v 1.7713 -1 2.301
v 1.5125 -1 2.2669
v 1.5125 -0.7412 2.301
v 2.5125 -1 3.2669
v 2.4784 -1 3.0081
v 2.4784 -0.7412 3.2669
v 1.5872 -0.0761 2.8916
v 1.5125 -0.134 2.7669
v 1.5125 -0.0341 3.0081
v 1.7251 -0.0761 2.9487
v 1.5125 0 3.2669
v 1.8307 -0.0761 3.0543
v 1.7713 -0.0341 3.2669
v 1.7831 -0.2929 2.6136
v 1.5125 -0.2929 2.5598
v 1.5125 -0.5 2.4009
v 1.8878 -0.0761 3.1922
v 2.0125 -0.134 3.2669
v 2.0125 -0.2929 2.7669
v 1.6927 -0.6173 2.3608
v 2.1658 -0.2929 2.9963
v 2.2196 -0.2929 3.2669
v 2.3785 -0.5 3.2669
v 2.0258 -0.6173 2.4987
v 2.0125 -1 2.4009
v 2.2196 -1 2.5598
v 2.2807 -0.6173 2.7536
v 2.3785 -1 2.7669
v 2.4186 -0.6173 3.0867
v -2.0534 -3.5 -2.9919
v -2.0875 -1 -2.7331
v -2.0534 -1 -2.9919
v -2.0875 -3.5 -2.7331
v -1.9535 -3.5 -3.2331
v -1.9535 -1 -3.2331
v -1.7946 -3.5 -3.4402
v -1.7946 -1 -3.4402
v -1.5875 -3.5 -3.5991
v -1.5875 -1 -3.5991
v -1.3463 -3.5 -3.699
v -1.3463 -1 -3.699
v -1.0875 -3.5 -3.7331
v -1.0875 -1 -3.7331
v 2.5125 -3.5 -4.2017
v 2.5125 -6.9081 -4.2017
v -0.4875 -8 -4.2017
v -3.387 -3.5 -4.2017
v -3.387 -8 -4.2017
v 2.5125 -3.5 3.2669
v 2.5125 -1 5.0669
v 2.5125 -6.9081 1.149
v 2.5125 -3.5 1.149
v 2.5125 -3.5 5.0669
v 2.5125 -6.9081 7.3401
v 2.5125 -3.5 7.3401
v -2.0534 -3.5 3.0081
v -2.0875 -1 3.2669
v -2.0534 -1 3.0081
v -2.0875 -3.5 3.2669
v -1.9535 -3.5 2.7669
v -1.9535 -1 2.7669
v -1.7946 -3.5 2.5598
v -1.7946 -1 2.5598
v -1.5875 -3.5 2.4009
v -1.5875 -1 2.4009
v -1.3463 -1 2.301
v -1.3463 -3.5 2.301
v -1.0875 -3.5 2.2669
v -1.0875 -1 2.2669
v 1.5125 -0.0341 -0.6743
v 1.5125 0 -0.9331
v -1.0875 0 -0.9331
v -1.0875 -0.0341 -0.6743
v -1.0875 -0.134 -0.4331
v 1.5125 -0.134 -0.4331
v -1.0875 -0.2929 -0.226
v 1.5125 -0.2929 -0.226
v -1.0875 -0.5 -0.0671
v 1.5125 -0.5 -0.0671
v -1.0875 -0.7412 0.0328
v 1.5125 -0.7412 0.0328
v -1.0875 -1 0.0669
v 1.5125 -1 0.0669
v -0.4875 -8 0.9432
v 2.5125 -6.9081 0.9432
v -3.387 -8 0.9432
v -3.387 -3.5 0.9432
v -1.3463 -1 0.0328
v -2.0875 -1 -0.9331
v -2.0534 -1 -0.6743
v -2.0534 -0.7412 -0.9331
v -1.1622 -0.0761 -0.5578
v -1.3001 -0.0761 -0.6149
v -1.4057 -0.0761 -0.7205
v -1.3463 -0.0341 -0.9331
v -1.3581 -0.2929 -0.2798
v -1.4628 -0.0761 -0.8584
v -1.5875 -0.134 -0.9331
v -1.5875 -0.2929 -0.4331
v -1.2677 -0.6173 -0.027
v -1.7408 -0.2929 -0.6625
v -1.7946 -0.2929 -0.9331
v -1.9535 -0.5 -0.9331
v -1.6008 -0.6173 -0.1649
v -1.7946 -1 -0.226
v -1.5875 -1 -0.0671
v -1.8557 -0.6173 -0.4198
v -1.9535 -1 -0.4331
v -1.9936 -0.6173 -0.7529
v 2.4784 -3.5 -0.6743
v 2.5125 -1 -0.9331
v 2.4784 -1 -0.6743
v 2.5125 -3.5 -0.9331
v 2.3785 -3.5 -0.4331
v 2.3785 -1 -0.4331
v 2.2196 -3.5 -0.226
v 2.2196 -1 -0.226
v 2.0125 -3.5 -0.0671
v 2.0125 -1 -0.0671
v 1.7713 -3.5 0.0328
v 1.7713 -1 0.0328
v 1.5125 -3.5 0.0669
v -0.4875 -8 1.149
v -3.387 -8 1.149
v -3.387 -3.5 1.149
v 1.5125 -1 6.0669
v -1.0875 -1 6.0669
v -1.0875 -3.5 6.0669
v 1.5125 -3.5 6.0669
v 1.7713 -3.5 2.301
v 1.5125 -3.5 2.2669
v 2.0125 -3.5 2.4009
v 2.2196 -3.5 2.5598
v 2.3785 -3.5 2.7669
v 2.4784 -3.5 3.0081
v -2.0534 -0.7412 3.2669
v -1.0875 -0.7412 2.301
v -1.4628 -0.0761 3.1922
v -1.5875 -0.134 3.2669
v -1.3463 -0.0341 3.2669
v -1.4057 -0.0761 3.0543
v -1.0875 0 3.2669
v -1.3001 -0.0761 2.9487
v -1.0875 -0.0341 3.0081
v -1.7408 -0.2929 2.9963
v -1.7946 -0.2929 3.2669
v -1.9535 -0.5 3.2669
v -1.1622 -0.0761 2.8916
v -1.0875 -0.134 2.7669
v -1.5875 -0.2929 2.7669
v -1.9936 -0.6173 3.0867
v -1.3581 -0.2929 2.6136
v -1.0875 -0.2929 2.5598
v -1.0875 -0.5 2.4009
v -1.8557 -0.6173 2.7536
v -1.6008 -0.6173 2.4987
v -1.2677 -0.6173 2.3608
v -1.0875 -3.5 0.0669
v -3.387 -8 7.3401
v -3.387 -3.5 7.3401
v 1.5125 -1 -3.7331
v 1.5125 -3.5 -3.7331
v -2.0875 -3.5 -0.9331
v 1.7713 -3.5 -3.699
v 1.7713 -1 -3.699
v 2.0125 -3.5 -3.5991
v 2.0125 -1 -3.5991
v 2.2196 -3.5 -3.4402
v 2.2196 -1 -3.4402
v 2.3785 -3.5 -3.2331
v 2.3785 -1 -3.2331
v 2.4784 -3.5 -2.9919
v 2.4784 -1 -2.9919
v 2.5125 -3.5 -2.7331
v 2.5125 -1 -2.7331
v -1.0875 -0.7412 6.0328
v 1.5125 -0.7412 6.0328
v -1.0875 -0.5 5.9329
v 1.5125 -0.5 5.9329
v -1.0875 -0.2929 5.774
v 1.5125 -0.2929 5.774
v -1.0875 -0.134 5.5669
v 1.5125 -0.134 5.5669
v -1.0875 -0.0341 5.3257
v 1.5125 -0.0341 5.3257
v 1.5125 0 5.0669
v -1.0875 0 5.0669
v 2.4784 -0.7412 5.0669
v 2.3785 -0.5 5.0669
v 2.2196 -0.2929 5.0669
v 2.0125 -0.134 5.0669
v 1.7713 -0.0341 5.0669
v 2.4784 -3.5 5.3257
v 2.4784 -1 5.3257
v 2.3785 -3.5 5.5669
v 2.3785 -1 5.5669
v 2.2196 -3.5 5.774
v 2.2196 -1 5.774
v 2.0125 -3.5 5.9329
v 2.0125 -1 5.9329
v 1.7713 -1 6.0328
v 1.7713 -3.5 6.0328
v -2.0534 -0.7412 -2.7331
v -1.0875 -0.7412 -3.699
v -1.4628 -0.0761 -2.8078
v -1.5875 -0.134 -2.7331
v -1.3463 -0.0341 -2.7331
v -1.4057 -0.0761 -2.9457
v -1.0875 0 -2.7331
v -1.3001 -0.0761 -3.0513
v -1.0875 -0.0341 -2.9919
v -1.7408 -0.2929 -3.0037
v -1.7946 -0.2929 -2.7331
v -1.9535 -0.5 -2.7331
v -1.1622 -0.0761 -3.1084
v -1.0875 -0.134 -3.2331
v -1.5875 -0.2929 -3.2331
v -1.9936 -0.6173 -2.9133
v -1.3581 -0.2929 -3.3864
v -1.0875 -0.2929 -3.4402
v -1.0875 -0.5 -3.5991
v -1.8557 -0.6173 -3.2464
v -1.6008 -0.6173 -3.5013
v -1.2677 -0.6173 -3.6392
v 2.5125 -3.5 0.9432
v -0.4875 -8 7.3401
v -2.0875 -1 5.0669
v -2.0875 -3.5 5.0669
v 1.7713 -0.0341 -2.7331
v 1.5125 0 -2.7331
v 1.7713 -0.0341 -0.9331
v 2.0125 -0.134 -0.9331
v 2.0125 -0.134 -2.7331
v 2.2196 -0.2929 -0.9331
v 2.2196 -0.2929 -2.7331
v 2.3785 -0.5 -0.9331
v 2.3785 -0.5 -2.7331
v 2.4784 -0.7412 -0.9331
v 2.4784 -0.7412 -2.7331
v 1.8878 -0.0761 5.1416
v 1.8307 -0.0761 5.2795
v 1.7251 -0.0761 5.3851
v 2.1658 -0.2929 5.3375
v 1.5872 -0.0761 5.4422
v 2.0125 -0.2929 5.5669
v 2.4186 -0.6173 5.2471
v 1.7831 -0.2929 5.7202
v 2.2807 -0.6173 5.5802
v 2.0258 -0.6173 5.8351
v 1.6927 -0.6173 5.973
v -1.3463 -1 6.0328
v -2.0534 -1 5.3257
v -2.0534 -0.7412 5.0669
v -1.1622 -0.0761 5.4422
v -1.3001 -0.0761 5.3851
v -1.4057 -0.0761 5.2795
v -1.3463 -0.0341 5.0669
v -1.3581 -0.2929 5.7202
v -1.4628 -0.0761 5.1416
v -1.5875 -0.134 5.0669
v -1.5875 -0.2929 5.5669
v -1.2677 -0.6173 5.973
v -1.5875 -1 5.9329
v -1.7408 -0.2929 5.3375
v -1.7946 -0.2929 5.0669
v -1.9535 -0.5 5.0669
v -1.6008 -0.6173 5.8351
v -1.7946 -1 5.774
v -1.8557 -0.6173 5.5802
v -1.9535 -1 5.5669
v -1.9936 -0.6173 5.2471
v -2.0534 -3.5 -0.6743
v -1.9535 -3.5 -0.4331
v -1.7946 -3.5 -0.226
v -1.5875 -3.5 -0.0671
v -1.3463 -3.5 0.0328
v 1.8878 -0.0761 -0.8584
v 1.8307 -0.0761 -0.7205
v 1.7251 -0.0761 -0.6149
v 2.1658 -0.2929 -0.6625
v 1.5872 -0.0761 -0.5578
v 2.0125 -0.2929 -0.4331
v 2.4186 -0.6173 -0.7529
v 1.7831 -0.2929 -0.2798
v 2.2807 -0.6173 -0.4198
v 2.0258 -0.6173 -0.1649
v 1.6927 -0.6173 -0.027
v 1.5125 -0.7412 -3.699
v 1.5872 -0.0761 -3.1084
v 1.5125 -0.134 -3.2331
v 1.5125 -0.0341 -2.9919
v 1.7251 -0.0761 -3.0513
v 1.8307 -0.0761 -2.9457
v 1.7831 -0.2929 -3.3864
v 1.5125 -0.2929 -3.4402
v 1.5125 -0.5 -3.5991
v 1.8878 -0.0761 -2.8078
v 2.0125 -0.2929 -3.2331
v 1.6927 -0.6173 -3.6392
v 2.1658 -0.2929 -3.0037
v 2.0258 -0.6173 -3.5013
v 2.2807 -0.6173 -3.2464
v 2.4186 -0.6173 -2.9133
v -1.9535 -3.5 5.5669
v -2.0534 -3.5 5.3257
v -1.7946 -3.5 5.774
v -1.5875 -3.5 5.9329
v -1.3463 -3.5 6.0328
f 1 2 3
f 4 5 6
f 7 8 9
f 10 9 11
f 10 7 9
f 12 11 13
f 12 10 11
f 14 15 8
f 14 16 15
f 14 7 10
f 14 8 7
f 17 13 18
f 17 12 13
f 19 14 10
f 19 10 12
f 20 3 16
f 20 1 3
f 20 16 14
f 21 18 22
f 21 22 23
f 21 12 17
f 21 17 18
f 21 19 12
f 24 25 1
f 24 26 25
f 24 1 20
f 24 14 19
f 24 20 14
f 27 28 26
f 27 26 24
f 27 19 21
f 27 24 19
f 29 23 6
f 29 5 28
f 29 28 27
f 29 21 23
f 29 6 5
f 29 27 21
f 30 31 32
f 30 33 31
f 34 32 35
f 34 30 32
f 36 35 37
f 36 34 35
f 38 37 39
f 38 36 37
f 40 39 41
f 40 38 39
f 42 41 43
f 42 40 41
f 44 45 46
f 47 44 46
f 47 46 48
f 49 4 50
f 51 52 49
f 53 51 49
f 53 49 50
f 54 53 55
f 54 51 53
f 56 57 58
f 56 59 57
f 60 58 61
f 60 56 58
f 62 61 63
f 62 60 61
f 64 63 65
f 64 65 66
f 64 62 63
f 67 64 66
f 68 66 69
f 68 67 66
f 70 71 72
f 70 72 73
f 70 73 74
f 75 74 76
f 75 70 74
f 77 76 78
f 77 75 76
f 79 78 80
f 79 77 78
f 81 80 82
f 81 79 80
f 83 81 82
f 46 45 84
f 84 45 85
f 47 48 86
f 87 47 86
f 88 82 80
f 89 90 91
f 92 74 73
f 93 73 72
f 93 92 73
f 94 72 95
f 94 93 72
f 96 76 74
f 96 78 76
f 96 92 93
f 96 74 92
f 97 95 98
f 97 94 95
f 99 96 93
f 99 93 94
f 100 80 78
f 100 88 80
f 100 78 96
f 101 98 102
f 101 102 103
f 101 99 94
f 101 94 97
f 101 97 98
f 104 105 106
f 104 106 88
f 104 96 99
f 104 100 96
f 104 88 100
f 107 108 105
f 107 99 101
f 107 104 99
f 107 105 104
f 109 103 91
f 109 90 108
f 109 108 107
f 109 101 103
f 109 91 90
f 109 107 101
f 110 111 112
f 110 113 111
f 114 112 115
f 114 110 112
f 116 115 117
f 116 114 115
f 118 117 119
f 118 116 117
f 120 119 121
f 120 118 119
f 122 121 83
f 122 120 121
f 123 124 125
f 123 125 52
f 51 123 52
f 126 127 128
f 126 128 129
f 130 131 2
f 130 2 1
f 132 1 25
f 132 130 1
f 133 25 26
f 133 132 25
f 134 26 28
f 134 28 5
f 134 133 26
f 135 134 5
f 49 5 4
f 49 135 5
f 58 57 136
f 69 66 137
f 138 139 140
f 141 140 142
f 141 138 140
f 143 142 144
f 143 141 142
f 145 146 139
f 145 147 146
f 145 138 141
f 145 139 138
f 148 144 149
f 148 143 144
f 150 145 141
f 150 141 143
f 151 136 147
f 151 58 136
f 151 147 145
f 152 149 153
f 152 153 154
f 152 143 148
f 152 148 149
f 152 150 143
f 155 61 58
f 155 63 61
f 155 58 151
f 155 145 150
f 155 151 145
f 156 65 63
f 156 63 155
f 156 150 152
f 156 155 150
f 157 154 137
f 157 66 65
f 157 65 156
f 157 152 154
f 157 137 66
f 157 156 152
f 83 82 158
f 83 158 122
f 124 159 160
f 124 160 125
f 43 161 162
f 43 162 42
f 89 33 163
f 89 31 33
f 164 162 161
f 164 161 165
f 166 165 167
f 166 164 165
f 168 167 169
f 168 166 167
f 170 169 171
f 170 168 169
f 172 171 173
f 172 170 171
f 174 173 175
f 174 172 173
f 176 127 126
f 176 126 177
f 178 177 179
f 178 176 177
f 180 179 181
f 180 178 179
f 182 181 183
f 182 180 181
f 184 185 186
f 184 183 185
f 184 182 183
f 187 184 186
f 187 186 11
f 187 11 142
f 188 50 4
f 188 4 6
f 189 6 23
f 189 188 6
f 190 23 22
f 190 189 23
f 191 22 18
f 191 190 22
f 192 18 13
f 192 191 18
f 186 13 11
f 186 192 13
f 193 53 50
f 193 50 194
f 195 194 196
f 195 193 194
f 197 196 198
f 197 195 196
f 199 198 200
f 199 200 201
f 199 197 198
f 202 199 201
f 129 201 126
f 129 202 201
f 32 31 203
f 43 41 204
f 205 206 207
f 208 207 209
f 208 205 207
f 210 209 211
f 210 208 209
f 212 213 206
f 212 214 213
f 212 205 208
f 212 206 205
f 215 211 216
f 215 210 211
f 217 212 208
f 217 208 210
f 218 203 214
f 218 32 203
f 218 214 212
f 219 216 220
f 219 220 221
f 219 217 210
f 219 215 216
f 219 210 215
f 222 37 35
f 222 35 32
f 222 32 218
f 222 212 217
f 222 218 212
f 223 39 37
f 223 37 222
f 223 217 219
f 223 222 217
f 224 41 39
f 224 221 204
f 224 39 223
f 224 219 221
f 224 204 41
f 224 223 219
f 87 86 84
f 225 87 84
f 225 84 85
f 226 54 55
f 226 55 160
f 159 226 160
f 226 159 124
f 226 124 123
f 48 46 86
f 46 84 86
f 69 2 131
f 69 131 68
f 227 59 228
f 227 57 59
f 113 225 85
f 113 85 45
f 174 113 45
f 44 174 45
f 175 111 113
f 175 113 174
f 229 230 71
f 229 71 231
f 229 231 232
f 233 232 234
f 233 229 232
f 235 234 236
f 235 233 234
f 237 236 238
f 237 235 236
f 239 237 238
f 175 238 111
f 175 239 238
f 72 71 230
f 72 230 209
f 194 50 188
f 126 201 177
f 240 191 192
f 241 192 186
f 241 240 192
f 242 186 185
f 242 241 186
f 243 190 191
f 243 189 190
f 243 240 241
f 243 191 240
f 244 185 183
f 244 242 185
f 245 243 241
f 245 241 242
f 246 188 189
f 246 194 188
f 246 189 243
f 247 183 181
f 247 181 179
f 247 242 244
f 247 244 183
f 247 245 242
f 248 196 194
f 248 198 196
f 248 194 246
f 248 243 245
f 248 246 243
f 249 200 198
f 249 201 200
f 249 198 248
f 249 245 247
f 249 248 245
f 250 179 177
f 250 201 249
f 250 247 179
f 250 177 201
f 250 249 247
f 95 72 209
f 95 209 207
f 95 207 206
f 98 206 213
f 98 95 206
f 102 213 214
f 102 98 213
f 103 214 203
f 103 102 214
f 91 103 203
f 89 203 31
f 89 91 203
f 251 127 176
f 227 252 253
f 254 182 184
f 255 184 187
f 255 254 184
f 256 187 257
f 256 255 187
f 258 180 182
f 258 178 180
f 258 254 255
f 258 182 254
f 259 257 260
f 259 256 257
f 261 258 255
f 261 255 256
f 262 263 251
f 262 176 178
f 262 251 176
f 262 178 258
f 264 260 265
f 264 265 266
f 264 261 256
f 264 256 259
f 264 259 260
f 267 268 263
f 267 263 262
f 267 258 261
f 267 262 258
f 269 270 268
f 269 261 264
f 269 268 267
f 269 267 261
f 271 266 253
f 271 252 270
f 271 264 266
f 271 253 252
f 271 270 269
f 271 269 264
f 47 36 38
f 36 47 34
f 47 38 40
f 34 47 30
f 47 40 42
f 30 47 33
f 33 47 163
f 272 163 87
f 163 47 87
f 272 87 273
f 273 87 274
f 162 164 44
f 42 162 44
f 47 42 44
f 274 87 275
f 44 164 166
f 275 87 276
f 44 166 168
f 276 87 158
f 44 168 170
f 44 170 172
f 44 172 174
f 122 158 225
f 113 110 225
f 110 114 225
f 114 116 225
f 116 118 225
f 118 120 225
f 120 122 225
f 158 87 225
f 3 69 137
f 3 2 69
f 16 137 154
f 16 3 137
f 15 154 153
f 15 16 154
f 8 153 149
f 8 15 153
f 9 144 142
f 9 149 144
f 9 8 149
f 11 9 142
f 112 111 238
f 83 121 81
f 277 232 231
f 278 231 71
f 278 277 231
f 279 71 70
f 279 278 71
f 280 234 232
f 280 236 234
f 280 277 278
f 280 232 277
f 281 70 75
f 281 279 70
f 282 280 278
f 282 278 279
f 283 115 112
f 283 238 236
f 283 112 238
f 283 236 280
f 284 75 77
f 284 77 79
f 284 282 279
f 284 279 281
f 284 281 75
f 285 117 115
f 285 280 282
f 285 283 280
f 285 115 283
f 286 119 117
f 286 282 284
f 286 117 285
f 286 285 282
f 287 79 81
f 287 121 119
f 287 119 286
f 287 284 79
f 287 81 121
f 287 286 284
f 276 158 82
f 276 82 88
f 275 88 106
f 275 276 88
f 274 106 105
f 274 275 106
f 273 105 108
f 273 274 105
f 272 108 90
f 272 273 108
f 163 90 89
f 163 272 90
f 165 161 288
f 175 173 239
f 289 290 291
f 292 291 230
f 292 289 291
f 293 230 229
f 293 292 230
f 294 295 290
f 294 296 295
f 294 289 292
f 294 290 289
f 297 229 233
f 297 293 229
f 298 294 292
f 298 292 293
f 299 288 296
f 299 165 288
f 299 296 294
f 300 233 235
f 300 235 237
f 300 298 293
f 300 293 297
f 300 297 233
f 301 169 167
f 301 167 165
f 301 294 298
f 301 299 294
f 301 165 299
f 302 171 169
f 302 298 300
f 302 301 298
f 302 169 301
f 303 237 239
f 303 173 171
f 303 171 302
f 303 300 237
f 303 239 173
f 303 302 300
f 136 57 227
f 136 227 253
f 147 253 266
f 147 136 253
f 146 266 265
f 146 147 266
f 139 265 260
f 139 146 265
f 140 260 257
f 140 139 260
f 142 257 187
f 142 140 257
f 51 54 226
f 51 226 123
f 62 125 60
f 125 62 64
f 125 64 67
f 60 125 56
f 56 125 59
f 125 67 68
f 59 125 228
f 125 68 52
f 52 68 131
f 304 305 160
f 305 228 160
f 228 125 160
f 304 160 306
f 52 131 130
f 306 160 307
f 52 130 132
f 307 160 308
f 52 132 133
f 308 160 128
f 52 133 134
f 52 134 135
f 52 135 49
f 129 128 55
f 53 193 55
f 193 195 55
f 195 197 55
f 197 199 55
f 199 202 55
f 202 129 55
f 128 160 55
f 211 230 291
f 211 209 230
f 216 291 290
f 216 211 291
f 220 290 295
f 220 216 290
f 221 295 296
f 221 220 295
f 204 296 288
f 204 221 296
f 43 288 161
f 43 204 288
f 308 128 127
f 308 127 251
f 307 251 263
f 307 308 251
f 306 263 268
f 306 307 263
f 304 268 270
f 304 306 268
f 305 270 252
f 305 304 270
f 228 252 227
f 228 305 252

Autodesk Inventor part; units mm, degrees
ref_plane "YZ Plane" through (0, 0, 0) normal (1, 0, 0) x (0, 1, 0)
ref_plane "XZ Plane" through (0, 0, 0) normal (0, 1, 0) x (-1, 0, 0)
ref_plane "XY Plane" through (0, 0, 0) normal (0, 0, 1) x (1, 0, 0)
sketch "Sketch1" plane through (0, 0, 0) normal (0, 1, 0) x (-1, 0, 0)
  line L0 (2.0875, 6.0669) -> (-2.5125, 6.0669)
  line L1 (-2.5125, 6.0669) -> (-2.5125, 2.2669)
  line L2 (-2.5125, 2.2669) -> (2.0875, 2.2669)
  line L3 (2.0875, 2.2669) -> (2.0875, 6.0669)
  line L4 (2.0875, 6.0669) -> (-2.5125, 2.2669) construction
  line L5 (-2.5125, 6.0669) -> (2.0875, 2.2669) construction
  line L6 (-2.5125, -3.7331) -> (2.0875, -3.7331)
  line L7 (2.0875, -3.7331) -> (2.0875, 0.0669)
  line L8 (2.0875, 0.0669) -> (-2.5125, 0.0669)
  line L9 (-2.5125, 0.0669) -> (-2.5125, -3.7331)
  line L10 (-2.5125, -3.7331) -> (2.0875, 0.0669) construction
  line L11 (2.0875, -3.7331) -> (-2.5125, 0.0669) construction
  point P0 (0, 0)
  point P1 (2.8581, 5.0437)
  point P2 (-0.2125, 4.1669)
  point P3 (-0.2125, -1.8331)
  point P4 (-0.2125, 0.0669)
  point P5 (-0.2125, 2.2669)
  dimension "d0" = 3.8
  dimension "d1" = 3.8
  dimension "d2" = 4.6
  dimension "d3" = 4.6
  dimension "d4" = 6
extrude "Extrusion1" add sketch "Sketch1" against normal blind 8
fillet "Fillet1" radius 1 5 edges at (-2.0875, -4, 6.0669) (2.5125, -4, 6.0669) (2.5125, -4, 2.2669) (2.5125, -4, 0.0669) (2.5125, -4, -3.7331)
fillet "Fillet2" radius 1 3 edges at (-2.0875, -4, 2.2669) (-2.0875, -4, -3.7331) (-2.0875, -4, 0.0669)
fillet "Fillet3" radius 1 16 edges at (-1.7946, 0, 2.5598) (-2.0875, 0, 4.1669) (-1.7946, 0, 5.774) (0.2125, 0, 6.0669) (2.2196, 0, 5.774) (2.5125, 0, 4.1669) (2.2196, 0, 2.5598) (0.2125, 0, 2.2669) (-1.7946, 0, -3.4402) (-2.0875, 0, -1.8331) (-1.7946, 0, -0.226) (0.2125, 0, 0.0669) (2.2196, 0, -0.226) (2.5125, 0, -1.8331) (2.2196, 0, -3.4402) (0.2125, 0, -3.7331)
sketch "Sketch2" plane through (0, -8, 0) normal (0, -1, 0) x (1, 0, 0)
  point P0 (0, 0)
sketch "Sketch3" plane through (0, -8, 0) normal (0, -1, 0) x (1, 0, 0)
  line L0 (-3.387, 0.9432) -> (2.5125, 0.9432)
  line L1 (2.5125, 0.9432) -> (2.5125, -4.2017)
  line L2 (2.5125, -4.2017) -> (-3.387, -4.2017)
  line L3 (-3.387, -4.2017) -> (-3.387, 0.9432)
  line L4 (-3.387, 1.149) -> (2.5125, 1.149)
  line L5 (2.5125, 1.149) -> (2.5125, 7.3401)
  line L6 (2.5125, 7.3401) -> (-3.387, 7.3401)
  line L7 (-3.387, 7.3401) -> (-3.387, 1.149)
  line L8 (2.5125, -0.9331) -> (2.5125, -2.7331) projected
  line L9 (2.5125, 5.0669) -> (2.5125, 3.2669) projected
  point P0 (0, 0)
  point P1 (2.5125, -1.8331)
  point P2 (2.5125, 4.1669)
  point P3 (2.5125, 4.2446)
  dimension "d16" = 5.8995
  dimension "d17" = 5.1449
  dimension "d18" = 6.191
  dimension "d19" = 0
  dimension "d20" = 0
extrude "Extrusion2" add sketch "Sketch3" against normal blind 4.5
chamfer "Chamfer1" distance 3 angle 20 1 edges at (2.5125, -8, 4.2446) measured on face at (0.546, -8, 3.2127)
chamfer "Chamfer2" distance 3 angle 20 1 edges at (2.5125, -8, -1.6292) measured on face at (-1.4205, -8, -0.7717)
properties part number "botones"
